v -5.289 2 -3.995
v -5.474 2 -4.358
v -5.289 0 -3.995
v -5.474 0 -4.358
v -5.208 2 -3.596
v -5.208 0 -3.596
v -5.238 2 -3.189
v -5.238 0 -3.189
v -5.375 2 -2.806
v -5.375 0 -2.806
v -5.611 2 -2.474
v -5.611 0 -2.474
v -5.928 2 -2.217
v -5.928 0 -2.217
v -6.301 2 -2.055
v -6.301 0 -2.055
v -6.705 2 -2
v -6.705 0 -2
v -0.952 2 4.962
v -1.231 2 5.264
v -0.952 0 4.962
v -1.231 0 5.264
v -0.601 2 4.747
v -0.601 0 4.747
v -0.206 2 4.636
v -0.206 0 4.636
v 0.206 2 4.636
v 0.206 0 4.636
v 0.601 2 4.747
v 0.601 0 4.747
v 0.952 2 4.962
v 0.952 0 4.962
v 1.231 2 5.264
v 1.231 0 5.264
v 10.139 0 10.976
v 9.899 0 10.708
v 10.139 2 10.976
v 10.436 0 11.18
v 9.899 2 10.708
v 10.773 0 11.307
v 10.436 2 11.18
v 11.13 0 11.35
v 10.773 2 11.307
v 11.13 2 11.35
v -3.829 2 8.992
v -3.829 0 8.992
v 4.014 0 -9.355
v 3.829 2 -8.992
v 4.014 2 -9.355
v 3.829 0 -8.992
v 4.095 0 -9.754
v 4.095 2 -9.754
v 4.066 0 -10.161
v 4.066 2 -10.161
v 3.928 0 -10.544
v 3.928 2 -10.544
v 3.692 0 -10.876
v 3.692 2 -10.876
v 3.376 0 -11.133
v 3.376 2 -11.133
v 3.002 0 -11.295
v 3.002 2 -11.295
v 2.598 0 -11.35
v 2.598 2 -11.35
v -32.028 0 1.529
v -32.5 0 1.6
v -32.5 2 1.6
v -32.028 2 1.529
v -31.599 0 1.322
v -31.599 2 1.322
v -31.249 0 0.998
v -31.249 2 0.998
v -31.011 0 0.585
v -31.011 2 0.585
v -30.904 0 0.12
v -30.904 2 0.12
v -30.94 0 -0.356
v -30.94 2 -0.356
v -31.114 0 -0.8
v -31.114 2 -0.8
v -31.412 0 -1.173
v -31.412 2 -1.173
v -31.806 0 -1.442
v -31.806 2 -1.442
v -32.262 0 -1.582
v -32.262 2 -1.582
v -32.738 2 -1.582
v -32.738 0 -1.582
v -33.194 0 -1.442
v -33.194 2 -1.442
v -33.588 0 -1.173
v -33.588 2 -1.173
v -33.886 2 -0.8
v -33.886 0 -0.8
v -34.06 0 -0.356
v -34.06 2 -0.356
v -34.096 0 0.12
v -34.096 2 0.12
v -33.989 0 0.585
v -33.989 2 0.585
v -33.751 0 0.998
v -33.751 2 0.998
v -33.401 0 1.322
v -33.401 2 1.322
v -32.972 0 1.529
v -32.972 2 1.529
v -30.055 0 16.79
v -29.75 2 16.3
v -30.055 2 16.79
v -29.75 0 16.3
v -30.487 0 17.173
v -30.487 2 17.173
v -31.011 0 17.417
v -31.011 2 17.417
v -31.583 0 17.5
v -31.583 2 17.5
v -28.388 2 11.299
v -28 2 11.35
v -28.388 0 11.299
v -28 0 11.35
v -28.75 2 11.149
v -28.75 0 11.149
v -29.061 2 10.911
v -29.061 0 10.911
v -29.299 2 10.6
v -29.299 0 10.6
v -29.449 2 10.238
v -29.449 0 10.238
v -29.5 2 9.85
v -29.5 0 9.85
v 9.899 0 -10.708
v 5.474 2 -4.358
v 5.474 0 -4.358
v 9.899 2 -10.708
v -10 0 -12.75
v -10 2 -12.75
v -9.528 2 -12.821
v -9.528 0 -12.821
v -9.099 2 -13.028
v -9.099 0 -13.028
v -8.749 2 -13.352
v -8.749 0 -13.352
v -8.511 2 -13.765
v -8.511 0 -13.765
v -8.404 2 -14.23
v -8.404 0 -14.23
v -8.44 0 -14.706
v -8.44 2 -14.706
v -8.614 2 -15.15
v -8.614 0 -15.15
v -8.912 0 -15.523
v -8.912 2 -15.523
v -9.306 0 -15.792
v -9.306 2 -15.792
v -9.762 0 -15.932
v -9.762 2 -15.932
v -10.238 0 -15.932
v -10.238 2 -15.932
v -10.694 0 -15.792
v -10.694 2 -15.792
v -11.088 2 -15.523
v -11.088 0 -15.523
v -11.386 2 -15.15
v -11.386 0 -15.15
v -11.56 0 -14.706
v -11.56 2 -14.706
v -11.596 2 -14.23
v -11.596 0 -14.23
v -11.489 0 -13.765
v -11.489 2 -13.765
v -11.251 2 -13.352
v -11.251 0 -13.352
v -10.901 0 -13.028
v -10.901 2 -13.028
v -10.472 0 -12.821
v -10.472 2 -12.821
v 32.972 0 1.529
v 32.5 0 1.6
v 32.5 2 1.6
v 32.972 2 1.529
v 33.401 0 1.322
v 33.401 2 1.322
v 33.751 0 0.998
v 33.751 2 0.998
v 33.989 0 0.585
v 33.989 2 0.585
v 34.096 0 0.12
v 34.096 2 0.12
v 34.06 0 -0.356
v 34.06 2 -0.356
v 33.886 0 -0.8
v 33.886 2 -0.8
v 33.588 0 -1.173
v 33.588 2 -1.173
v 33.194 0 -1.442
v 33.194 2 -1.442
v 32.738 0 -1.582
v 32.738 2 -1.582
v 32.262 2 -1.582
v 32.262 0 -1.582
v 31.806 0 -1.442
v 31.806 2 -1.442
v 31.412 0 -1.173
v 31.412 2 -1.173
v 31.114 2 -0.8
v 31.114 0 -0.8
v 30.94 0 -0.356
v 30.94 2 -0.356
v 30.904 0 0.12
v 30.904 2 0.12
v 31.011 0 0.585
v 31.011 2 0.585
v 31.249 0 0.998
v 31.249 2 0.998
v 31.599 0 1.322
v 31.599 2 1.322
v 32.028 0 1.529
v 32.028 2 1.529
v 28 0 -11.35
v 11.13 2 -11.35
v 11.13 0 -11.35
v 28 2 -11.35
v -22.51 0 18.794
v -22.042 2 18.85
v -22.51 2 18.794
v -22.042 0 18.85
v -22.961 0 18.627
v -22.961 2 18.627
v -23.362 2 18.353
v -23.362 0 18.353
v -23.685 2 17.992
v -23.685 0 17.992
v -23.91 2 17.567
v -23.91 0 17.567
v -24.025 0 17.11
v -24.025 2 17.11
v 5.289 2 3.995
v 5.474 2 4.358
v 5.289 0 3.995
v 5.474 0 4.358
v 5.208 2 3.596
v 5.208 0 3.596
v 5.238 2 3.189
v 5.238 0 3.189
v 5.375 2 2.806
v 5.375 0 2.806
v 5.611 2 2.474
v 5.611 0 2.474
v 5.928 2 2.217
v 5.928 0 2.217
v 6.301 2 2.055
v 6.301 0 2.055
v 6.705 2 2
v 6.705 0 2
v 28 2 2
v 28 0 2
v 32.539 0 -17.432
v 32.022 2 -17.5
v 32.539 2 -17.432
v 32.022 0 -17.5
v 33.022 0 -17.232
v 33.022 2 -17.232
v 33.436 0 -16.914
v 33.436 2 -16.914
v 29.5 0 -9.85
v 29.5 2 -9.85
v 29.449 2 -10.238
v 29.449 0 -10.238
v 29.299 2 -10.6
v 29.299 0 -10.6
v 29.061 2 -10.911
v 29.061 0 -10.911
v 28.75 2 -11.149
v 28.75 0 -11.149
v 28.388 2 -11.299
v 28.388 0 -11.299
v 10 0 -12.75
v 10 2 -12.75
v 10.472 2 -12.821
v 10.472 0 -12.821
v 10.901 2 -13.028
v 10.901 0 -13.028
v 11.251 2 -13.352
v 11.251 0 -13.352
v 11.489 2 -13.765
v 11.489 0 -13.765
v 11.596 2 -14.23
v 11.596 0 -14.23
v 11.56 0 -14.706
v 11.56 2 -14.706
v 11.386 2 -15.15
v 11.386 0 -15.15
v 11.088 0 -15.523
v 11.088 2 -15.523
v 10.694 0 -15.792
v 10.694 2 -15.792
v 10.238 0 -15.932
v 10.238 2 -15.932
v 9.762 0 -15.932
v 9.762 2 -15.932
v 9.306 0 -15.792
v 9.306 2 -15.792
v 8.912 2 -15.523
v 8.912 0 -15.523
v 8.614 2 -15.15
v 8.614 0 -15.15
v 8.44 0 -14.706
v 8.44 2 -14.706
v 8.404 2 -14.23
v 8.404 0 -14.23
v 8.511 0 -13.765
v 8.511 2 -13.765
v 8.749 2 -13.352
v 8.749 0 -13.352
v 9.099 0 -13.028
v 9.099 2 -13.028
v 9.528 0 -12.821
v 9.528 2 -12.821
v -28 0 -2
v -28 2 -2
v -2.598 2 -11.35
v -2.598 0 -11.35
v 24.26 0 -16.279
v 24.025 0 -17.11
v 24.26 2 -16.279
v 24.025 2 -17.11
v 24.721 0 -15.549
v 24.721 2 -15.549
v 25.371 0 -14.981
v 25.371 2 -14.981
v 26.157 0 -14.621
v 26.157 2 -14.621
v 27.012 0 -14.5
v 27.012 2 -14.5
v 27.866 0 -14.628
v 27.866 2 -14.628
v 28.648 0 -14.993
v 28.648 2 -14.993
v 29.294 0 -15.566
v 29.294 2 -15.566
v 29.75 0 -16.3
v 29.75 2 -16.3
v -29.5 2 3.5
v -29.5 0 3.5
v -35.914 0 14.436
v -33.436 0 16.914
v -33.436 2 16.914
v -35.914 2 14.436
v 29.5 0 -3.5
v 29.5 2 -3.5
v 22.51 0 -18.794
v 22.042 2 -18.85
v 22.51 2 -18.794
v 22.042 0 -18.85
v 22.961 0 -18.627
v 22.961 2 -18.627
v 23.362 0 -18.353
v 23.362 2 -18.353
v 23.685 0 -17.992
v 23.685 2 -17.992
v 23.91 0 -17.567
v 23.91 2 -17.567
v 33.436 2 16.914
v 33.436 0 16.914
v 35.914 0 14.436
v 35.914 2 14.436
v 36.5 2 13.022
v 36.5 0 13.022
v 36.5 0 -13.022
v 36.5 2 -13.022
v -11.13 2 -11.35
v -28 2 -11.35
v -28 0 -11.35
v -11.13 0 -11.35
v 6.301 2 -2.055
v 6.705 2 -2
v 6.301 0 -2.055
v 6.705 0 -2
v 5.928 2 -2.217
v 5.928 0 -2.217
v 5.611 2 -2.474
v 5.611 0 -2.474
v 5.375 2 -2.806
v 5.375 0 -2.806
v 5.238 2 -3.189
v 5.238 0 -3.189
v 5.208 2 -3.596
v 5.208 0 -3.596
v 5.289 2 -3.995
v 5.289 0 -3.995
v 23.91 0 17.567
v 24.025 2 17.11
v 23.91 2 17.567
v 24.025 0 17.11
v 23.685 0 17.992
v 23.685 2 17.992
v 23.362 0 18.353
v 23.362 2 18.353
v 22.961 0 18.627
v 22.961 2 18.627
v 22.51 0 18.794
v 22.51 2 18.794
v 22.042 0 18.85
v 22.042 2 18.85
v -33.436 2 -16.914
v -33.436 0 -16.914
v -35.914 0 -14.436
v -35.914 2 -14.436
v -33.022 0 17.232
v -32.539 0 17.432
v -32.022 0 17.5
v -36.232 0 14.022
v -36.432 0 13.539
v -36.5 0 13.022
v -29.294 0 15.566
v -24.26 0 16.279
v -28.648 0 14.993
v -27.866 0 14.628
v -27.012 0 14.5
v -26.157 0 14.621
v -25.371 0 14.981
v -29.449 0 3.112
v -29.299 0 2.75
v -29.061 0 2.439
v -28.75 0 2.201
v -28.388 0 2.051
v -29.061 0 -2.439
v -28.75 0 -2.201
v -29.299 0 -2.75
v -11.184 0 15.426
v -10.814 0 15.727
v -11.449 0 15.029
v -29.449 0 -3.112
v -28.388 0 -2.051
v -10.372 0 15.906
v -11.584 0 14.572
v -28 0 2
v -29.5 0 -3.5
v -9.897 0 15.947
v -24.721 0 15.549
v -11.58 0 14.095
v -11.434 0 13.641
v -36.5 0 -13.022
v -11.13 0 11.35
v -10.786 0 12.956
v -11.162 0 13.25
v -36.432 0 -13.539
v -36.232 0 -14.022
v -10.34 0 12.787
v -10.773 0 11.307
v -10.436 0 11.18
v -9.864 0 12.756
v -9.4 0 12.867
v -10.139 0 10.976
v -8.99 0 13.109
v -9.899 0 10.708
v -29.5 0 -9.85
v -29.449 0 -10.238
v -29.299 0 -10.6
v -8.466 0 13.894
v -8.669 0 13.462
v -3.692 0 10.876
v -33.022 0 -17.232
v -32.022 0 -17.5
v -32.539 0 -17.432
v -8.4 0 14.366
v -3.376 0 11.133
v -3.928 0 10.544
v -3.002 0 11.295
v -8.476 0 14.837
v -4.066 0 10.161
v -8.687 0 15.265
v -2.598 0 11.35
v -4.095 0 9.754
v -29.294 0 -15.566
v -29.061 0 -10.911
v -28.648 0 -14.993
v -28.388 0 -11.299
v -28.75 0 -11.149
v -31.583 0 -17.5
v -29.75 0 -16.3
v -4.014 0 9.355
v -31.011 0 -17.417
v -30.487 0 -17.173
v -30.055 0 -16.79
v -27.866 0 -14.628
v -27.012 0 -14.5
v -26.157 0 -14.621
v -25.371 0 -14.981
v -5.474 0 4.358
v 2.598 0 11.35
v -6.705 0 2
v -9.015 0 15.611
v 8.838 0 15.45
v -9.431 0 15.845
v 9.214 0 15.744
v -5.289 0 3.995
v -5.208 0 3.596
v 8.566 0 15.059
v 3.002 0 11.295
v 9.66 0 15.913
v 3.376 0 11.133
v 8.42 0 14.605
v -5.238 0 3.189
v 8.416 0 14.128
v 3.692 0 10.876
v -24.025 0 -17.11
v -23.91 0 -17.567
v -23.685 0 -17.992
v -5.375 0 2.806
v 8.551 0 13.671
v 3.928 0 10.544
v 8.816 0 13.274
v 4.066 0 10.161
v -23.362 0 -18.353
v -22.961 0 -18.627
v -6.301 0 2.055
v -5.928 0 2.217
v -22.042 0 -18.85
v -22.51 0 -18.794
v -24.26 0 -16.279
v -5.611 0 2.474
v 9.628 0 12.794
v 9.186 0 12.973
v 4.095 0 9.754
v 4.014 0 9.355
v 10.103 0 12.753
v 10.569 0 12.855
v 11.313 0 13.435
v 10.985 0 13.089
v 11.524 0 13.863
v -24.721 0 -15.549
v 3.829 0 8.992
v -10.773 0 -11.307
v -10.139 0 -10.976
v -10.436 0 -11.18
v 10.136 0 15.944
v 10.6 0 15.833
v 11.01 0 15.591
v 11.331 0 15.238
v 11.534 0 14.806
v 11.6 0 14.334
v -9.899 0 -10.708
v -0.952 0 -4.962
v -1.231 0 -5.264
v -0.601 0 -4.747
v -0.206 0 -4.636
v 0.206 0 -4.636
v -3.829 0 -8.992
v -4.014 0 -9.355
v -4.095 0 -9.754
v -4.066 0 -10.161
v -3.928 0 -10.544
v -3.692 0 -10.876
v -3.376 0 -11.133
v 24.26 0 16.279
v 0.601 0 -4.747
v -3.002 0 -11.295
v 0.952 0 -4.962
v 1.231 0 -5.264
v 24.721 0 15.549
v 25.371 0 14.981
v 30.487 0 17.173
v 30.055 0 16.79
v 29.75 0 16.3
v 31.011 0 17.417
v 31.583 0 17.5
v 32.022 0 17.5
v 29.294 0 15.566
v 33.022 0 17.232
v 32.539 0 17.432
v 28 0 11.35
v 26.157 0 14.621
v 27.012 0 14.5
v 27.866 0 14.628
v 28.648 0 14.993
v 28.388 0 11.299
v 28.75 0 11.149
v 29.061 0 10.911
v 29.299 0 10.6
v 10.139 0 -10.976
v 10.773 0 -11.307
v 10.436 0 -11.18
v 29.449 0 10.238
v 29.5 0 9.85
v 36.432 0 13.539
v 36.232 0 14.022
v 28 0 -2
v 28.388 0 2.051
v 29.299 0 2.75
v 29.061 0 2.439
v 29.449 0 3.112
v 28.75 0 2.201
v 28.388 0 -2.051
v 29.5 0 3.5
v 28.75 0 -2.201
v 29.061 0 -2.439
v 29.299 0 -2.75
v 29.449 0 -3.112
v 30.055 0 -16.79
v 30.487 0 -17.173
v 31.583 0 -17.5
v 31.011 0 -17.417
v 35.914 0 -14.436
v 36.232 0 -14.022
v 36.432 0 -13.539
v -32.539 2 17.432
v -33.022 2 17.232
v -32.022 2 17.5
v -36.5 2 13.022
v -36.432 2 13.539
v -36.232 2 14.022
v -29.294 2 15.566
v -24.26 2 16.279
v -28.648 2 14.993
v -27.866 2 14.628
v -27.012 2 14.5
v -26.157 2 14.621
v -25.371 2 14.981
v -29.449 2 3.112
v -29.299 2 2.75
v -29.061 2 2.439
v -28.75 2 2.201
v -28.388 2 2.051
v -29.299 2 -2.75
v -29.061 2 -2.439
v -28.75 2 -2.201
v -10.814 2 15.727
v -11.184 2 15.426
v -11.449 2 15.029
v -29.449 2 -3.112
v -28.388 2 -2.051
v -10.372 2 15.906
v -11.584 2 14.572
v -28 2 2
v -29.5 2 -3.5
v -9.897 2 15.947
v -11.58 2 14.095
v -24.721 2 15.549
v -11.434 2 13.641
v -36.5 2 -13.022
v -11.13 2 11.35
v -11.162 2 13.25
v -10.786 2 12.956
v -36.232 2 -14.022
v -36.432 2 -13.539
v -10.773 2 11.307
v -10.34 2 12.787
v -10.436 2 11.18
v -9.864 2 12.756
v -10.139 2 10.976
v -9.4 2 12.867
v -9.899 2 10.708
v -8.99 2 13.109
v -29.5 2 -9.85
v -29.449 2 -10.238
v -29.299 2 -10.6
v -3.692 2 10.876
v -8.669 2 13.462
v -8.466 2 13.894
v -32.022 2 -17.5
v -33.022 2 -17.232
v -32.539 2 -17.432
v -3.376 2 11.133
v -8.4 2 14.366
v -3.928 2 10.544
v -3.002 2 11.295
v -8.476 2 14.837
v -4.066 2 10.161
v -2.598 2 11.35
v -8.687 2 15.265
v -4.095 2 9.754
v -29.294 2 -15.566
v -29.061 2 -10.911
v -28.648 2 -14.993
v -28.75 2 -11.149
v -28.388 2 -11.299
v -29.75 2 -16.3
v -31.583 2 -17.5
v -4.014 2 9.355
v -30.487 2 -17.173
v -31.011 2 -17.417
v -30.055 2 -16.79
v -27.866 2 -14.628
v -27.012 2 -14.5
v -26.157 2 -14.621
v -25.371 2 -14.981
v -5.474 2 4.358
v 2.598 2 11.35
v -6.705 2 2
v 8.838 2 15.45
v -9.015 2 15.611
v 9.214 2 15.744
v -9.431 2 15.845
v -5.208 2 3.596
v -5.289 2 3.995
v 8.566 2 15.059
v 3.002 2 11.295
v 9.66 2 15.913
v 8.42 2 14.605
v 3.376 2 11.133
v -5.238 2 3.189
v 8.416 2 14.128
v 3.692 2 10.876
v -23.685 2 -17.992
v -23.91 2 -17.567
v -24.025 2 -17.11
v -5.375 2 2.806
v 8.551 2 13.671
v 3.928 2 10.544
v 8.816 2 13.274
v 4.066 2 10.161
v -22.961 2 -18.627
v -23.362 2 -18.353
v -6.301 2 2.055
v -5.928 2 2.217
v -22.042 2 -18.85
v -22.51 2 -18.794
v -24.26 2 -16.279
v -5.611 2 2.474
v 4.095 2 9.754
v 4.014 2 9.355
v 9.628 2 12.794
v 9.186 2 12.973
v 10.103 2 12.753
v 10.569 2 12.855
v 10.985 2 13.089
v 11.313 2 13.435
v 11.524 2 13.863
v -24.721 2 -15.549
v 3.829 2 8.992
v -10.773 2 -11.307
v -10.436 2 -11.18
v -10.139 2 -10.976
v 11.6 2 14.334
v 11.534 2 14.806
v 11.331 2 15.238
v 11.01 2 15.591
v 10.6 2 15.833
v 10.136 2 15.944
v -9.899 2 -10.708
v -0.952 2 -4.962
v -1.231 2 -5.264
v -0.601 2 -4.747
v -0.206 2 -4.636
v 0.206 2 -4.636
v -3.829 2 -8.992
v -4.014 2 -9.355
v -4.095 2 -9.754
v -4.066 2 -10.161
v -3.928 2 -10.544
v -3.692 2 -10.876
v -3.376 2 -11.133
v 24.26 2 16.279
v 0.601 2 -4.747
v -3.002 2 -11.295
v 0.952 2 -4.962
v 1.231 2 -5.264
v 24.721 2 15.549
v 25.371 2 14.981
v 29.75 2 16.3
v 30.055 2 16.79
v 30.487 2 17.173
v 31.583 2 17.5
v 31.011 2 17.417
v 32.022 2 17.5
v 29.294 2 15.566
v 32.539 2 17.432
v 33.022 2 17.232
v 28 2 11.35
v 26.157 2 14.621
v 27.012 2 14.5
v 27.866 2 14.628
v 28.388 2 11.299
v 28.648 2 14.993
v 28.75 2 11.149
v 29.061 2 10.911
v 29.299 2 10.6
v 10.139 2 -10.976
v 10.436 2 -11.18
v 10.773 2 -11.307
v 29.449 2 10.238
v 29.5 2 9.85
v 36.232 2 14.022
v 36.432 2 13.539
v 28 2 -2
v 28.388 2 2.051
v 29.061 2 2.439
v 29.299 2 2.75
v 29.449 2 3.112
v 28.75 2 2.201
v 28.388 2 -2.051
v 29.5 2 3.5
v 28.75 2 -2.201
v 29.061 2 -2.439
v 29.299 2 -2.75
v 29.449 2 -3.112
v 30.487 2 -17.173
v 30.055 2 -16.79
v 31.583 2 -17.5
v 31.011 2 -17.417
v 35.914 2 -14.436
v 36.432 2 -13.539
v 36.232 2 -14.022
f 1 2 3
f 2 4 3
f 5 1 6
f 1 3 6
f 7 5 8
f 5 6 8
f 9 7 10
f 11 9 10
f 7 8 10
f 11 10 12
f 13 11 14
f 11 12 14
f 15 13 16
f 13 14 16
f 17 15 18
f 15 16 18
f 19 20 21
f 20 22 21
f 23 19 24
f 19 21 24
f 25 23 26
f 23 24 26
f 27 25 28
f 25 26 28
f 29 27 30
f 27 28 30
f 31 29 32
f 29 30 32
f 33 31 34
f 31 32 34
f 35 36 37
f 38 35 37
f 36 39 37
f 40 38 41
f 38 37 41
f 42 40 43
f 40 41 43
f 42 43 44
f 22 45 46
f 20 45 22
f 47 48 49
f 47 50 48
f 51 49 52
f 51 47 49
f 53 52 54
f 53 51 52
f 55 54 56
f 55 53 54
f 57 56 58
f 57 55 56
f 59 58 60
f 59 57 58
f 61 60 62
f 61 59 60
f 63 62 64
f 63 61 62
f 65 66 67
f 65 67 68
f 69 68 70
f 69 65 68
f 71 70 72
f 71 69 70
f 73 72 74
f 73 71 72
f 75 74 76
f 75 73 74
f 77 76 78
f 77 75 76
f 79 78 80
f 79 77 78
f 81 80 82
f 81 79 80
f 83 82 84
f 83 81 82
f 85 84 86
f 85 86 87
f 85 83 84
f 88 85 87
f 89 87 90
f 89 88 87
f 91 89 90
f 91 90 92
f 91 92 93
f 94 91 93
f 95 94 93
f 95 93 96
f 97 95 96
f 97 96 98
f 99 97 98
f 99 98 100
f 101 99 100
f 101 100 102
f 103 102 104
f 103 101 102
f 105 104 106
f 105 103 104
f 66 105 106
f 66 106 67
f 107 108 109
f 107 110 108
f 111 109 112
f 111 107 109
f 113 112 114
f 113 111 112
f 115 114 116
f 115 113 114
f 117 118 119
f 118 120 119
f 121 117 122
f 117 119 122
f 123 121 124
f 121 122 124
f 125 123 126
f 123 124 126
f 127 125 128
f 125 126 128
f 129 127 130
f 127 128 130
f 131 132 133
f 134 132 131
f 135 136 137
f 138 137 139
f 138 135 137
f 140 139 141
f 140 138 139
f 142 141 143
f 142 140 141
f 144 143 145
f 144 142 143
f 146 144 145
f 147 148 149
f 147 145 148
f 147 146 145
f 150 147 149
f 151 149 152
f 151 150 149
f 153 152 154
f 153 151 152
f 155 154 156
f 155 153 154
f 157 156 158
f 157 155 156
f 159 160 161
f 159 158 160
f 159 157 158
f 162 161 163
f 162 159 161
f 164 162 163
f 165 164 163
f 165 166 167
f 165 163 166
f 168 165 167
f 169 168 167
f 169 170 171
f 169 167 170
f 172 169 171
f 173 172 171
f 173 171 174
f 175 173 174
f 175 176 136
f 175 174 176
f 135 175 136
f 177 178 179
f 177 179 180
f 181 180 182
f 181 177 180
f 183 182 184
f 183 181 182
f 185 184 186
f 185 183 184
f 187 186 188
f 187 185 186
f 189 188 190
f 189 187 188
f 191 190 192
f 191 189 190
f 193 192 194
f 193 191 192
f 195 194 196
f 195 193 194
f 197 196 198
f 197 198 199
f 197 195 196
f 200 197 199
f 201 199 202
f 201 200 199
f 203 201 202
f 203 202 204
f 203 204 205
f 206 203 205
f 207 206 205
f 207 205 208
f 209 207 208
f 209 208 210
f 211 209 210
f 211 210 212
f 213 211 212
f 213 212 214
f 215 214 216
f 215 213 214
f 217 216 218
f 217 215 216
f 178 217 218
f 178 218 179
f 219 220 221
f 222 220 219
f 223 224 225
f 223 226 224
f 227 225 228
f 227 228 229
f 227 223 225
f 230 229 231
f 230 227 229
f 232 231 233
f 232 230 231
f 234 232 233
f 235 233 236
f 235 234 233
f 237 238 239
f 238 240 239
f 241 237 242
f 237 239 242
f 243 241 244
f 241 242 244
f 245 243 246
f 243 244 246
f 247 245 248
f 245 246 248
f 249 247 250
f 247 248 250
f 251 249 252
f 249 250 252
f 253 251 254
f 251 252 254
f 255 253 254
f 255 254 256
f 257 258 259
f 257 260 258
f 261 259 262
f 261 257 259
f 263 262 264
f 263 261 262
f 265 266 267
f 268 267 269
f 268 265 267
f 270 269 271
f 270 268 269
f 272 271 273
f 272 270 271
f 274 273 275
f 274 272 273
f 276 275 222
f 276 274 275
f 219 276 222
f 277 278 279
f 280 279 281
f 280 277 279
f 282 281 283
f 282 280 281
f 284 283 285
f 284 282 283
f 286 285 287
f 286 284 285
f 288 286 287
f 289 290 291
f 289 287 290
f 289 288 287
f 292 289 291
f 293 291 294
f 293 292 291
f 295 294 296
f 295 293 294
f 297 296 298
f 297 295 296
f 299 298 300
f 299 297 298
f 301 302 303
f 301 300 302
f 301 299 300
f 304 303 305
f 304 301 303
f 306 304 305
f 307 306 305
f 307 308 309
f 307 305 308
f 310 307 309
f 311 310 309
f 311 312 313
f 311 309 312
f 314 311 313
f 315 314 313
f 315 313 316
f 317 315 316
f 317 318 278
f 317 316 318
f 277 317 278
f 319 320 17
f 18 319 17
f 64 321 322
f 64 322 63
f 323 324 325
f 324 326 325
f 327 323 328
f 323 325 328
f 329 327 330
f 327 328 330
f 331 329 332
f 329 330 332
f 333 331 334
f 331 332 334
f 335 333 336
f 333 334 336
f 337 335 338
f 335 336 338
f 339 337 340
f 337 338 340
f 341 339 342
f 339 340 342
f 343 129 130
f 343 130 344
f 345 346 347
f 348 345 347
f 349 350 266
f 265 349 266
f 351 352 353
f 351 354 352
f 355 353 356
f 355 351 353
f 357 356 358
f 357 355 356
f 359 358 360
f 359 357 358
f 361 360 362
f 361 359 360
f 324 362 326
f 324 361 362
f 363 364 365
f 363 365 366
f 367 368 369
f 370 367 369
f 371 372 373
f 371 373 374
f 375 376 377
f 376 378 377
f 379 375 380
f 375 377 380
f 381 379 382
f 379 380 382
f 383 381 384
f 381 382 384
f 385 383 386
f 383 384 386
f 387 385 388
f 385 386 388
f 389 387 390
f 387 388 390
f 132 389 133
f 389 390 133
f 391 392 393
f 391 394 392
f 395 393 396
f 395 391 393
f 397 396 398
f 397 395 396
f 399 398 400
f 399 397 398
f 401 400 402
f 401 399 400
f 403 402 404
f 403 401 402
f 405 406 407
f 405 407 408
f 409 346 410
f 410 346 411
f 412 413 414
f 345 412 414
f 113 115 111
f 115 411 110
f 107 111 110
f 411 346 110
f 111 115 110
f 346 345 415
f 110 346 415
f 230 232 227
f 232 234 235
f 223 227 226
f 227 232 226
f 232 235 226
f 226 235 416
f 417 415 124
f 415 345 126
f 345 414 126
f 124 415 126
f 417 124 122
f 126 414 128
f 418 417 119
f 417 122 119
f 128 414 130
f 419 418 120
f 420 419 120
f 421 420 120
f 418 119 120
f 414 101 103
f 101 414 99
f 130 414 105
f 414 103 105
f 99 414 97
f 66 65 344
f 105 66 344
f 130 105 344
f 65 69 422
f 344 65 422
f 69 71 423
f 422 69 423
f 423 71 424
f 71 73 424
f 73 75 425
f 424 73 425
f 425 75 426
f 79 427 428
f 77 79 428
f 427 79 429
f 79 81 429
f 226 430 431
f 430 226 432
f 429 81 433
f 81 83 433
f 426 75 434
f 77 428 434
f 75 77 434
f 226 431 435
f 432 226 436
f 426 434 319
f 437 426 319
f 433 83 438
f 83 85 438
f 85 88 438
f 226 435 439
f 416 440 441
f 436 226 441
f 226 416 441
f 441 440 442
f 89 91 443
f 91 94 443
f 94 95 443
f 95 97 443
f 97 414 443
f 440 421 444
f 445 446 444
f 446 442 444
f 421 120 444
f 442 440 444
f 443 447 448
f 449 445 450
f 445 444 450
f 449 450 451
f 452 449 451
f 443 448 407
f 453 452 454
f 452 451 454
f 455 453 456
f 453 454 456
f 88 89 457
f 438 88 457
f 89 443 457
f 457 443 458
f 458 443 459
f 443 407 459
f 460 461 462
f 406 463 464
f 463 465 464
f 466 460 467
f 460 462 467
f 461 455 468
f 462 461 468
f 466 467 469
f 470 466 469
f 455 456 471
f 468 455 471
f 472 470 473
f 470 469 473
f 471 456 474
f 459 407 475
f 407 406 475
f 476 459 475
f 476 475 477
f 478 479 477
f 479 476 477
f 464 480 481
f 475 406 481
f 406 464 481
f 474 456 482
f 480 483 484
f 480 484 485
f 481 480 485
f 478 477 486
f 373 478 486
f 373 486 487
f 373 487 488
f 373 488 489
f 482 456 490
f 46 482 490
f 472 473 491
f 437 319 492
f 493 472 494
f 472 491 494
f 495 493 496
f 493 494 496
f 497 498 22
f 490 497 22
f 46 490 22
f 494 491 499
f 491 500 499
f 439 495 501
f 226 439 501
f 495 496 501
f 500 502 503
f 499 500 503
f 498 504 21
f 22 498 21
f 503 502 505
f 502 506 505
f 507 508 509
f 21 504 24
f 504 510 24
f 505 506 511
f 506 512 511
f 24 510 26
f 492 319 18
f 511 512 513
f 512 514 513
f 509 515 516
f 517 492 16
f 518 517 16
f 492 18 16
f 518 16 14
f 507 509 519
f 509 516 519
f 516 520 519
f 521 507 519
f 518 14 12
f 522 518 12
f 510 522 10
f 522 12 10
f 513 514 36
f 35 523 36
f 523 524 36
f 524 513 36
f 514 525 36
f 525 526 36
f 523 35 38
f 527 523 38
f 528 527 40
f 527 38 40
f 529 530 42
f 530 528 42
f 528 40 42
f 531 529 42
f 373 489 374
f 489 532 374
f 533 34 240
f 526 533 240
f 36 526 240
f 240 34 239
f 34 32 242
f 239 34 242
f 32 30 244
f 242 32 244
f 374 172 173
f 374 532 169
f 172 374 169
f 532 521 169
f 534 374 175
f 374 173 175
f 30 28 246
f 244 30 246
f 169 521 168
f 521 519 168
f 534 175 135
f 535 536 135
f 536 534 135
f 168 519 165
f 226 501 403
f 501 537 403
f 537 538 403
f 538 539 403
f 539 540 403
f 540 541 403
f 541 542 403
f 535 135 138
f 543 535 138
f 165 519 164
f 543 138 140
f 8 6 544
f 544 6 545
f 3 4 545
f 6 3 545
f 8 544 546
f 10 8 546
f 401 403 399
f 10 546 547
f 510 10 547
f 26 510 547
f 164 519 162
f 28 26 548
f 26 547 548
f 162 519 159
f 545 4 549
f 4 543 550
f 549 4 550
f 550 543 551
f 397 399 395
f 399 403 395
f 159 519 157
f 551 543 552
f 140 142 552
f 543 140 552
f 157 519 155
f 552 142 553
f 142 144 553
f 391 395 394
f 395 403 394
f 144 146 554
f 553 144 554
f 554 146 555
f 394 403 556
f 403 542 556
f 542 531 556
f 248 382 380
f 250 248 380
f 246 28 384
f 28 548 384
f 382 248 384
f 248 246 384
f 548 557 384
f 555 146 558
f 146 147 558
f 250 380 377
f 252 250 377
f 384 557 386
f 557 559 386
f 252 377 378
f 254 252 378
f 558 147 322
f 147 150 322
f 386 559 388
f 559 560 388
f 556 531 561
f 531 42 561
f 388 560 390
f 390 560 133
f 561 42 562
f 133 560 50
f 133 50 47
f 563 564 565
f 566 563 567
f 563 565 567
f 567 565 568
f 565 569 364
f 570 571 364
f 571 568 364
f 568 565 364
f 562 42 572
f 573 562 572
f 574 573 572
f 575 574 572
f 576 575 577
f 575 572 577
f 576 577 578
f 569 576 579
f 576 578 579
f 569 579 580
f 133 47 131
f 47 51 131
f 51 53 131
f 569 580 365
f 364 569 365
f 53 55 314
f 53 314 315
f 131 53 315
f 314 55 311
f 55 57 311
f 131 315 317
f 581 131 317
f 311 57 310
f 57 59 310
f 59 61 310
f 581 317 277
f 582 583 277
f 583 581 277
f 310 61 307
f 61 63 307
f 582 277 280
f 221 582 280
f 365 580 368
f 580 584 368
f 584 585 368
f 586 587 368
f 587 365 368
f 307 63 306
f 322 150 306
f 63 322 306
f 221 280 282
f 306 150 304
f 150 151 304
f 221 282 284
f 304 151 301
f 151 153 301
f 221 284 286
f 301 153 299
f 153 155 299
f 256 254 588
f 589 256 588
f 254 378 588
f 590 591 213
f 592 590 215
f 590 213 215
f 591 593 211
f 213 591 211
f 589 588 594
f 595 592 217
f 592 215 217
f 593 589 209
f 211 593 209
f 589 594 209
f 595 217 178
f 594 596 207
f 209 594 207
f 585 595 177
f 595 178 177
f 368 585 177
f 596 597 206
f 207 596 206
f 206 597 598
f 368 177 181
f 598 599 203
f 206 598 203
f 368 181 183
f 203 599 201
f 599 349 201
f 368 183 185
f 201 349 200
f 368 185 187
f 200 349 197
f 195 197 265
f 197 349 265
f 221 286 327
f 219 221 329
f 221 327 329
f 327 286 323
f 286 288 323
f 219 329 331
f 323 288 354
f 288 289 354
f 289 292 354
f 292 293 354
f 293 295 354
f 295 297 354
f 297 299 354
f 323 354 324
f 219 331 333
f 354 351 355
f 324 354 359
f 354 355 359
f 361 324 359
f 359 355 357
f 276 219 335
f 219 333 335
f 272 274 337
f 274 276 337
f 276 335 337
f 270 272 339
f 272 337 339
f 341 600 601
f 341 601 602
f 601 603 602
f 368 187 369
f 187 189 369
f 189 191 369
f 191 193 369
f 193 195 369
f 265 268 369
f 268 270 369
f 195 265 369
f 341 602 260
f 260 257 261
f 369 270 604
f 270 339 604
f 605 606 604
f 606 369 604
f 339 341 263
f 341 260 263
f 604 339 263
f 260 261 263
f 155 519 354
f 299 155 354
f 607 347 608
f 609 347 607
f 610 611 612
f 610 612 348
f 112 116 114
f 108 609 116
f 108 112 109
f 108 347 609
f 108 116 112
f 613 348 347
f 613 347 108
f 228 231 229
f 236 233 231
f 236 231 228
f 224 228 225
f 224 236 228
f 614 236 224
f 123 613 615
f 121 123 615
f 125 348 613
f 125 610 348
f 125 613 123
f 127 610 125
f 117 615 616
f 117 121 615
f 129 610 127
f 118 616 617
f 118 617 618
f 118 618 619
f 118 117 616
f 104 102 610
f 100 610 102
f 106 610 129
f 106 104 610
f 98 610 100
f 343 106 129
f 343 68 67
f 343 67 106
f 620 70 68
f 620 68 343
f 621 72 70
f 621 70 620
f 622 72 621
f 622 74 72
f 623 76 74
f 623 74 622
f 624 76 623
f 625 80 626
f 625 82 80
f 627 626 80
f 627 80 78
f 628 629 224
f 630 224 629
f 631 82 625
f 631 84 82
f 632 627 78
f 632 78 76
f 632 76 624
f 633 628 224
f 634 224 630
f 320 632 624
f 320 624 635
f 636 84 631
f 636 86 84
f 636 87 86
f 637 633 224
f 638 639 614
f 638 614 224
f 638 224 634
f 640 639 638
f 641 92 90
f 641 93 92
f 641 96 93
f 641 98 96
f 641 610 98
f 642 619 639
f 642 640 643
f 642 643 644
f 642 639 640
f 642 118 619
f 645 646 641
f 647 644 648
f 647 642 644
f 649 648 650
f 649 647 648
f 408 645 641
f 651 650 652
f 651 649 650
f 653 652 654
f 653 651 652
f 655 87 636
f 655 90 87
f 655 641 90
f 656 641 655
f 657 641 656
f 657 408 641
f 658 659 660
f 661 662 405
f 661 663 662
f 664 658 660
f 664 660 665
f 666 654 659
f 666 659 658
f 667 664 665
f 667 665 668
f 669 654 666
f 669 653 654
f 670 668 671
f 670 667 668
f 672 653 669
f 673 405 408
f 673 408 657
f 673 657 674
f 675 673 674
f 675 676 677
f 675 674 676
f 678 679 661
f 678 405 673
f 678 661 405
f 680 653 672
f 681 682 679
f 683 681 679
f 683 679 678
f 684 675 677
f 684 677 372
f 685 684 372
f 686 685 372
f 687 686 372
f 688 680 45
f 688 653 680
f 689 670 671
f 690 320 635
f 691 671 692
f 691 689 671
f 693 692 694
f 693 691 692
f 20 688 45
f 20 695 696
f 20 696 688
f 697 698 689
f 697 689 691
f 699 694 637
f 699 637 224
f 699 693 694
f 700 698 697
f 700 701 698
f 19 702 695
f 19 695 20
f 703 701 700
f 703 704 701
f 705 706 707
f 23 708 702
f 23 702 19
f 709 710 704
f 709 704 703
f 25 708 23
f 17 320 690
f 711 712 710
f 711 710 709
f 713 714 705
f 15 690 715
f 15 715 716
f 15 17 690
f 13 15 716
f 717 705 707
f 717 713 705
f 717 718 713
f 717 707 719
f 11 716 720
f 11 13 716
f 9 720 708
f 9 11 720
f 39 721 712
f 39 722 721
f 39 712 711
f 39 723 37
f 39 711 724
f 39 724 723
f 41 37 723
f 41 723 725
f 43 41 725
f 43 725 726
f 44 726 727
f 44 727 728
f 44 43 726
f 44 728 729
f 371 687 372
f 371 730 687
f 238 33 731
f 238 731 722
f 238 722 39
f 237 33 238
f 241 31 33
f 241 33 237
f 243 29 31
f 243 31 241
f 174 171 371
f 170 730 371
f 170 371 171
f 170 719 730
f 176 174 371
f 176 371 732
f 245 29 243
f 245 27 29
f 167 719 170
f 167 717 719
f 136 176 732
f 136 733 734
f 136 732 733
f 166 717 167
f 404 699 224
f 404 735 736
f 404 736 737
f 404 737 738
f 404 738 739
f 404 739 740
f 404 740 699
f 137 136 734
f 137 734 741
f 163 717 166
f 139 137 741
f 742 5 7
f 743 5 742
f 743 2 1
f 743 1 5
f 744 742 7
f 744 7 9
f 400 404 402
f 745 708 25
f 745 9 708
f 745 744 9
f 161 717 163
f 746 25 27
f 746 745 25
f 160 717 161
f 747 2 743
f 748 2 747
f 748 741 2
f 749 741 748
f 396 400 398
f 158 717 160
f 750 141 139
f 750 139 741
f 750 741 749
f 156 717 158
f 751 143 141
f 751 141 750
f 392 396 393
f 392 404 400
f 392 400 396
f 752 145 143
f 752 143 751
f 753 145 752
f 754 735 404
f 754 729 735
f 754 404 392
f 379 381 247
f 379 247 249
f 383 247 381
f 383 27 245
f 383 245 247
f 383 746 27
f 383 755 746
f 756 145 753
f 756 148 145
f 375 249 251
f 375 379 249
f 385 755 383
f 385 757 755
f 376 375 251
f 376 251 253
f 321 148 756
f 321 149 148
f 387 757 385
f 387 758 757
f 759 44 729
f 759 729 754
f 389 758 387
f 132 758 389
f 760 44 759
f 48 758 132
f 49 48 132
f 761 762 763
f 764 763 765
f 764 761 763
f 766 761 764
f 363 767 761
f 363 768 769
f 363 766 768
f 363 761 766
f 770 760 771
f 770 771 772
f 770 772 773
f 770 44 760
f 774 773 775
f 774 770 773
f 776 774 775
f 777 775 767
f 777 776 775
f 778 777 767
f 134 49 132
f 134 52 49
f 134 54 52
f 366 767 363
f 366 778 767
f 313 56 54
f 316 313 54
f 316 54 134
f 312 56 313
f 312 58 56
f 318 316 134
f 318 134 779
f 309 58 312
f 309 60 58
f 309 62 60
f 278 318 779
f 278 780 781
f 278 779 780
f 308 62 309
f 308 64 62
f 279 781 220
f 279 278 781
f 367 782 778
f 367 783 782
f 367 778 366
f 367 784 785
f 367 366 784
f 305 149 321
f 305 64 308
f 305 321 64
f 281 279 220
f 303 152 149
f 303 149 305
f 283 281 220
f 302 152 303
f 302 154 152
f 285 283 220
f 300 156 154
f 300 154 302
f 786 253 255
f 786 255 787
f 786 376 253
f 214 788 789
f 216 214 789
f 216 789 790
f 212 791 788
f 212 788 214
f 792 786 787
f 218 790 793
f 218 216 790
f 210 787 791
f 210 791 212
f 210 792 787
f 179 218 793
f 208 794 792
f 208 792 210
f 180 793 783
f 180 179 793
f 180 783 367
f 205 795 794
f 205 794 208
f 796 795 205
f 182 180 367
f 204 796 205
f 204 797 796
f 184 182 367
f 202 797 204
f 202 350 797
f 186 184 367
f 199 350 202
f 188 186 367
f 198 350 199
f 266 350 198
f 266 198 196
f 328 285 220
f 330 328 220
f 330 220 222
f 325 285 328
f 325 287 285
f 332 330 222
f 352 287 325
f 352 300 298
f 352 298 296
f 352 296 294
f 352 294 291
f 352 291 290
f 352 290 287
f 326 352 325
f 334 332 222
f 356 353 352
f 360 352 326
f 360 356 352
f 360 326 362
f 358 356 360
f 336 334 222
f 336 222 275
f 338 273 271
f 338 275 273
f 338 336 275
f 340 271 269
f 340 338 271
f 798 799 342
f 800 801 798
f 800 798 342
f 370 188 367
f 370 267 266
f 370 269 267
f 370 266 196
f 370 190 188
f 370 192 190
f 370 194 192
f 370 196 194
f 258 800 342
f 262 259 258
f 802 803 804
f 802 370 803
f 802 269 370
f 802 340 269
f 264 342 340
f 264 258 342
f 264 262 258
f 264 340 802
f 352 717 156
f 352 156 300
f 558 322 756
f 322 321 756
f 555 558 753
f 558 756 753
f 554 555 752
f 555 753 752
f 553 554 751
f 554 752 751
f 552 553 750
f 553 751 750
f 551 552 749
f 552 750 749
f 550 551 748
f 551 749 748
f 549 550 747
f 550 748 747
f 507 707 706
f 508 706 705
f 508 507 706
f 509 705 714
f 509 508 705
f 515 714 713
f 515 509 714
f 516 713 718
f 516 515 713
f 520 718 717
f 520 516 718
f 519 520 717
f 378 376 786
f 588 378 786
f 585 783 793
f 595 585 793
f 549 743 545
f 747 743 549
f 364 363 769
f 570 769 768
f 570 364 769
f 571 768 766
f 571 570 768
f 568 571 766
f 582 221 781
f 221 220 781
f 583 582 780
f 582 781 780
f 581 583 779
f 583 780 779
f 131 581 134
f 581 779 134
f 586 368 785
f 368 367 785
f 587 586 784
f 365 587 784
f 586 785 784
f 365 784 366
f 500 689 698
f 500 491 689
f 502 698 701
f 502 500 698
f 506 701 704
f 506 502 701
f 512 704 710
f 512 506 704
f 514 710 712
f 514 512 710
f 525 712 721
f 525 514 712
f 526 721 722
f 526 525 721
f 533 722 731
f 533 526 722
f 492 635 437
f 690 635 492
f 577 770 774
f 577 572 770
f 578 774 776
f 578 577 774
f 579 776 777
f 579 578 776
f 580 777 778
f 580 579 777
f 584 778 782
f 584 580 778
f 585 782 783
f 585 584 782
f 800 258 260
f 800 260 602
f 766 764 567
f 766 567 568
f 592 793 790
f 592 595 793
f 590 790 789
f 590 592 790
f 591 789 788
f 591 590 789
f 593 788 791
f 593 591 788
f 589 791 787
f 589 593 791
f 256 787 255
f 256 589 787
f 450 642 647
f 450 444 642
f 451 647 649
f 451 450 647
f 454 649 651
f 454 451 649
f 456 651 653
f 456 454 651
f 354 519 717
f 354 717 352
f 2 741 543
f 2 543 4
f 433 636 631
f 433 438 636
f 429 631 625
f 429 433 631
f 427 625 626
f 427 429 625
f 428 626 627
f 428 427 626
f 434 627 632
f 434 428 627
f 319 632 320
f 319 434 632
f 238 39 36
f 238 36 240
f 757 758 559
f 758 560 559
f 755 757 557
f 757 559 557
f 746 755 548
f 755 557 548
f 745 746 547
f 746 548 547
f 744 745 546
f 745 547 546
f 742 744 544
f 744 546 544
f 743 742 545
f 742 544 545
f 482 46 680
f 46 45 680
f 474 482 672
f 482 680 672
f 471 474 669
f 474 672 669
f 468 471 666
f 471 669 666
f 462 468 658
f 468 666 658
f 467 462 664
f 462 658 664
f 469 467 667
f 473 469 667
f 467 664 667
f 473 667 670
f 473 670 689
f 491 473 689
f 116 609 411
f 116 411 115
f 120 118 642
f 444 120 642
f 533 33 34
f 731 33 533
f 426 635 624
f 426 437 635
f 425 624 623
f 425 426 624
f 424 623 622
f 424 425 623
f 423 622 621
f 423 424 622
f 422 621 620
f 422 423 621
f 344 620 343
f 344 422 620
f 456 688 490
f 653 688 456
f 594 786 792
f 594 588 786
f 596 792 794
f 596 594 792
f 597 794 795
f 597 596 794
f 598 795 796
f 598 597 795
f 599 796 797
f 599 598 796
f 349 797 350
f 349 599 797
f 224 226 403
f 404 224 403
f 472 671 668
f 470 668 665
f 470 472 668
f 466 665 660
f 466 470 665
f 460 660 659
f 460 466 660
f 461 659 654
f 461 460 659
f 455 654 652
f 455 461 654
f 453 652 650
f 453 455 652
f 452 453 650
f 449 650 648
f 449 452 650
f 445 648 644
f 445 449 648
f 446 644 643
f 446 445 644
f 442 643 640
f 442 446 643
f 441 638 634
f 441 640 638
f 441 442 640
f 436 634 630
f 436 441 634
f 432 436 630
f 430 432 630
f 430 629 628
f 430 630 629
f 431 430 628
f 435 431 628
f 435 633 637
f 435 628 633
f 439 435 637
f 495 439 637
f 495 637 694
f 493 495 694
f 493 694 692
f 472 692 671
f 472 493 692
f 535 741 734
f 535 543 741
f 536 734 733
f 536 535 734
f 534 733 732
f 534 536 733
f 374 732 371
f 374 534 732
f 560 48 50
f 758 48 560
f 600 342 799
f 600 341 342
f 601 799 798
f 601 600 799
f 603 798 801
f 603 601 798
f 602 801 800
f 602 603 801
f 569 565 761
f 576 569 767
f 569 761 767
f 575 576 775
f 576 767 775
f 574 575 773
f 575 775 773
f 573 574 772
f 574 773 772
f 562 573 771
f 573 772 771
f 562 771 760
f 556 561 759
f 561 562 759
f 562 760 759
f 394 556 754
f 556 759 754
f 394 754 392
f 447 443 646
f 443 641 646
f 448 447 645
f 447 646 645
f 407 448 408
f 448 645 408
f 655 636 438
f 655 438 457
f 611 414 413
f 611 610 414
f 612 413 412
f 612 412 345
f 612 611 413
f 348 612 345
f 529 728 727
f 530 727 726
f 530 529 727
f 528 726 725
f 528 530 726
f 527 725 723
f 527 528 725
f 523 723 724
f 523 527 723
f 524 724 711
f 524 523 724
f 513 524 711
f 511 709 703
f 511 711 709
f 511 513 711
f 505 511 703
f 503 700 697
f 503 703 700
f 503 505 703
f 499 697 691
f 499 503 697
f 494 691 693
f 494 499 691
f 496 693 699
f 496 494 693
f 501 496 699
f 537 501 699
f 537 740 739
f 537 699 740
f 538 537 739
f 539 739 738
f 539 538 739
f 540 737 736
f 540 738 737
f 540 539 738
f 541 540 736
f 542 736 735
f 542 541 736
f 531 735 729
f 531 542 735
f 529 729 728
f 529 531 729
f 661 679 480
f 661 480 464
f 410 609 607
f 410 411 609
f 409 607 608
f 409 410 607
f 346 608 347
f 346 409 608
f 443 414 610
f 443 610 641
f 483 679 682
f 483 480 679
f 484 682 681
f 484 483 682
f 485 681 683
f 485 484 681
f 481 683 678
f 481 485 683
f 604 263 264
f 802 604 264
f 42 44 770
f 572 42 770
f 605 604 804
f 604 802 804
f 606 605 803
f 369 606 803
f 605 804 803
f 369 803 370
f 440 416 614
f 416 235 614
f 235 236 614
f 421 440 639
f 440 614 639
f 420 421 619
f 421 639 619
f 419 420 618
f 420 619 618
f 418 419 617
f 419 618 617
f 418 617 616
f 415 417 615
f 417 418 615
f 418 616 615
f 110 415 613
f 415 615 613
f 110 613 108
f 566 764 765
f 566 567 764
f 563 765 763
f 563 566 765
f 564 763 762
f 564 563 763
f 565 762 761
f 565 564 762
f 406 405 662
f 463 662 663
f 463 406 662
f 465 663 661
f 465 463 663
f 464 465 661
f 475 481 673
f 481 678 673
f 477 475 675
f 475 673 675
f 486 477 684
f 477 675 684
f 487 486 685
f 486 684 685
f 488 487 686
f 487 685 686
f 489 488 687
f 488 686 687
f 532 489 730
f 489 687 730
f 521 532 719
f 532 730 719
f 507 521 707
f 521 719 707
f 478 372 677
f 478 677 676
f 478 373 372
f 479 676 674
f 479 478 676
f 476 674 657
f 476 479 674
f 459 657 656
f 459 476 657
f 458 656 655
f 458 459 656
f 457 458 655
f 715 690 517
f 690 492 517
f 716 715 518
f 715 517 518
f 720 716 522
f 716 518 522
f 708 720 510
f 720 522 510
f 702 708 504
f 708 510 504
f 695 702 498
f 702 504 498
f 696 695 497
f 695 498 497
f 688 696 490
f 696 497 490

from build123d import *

# Parameters (mm, degrees)
SKETCH_1_W          = 73
SKETCH_1_H          = 37.7
SKETCH_1_R          = 1.6
EXTRUDE_1_DEPTH     = 2
SKETCH_2_W          = 59
SKETCH_2_H          = 22.7
CUT_EXTRUDE_1_DEPTH = 10
SKETCH_3_W          = 59
SKETCH_3_H          = 4
EXTRUDE_1_2_DEPTH   = 2
CUT_EXTRUDE_START   = -2
SKETCH_4_R          = 1.6
CUT_EXTRUDE_2_DEPTH = 2
FILLET_2_R          = 1.5
CHAMFER_1_SIZE      = 5
SKETCH_6_R          = 3
CUT_EXTRUDE_3_DEPTH = 10
CUT_EXTRUDE_4_DEPTH = 10
FILLET_3_R          = 2


with BuildPart() as part:
    # 草图1 → Extrude 1 (new body)
    with BuildSketch(Plane(origin=(0, 0, 0), x_dir=(1, 0, 0), z_dir=(0, 1, 0))):
        Rectangle(SKETCH_1_W, SKETCH_1_H)
        with Locations(Location((10, -14.35, 0), (0, 0, 270))):
            Circle(SKETCH_1_R, mode=Mode.SUBTRACT)
        with Locations(Location((-10, -14.35, 0), (0, 0, 270))):
            Circle(SKETCH_1_R, mode=Mode.SUBTRACT)
        with Locations(Location((-10, 14.35, 0), (0, 0, 270))):
            Circle(SKETCH_1_R, mode=Mode.SUBTRACT)
        with Locations(Location((10, 14.35, 0), (0, 0, 270))):
            Circle(SKETCH_1_R, mode=Mode.SUBTRACT)
        with Locations(Location((-32.5, 0, 0), (0, 0, 270))):
            Circle(SKETCH_1_R, mode=Mode.SUBTRACT)
        with Locations(Location((32.5, 0, 0), (0, 0, 270))):
            Circle(SKETCH_1_R, mode=Mode.SUBTRACT)
    extrude(amount=EXTRUDE_1_DEPTH)

    # 草图2 → 切除-拉伸1 (cut)
    with BuildSketch(Plane(origin=(0, 2, 0), x_dir=(1, 0, 0), z_dir=(0, 1, 0))):
        Rectangle(SKETCH_2_W, SKETCH_2_H)
    extrude(amount=-CUT_EXTRUDE_1_DEPTH, mode=Mode.SUBTRACT)

    # 草图3 → Extrude 1 2 (add)
    with BuildSketch(Plane(origin=(0, 2, 0), x_dir=(1, 0, 0), z_dir=(0, 1, 0))):
        Rectangle(SKETCH_3_W, SKETCH_3_H)
        Polygon((-11.640877602, 13.206531288), (8.359122398, -15.493468712), (11.640877602, -13.206531288), (-8.359122398, 15.493468712), align=None)
        Polygon((8.359122398, 15.493468712), (-11.640877602, -13.206531288), (-8.359122398, -15.493468712), (11.640877602, 13.206531288), align=None)
    extrude(amount=-EXTRUDE_1_2_DEPTH)

    # 草图4 → 切除-拉伸2 (cut)
    with BuildSketch(Plane(origin=(0, 2, 0), x_dir=(1, 0, 0), z_dir=(0, 1, 0)).offset(CUT_EXTRUDE_START)):
        with Locations(Location((10, -14.35, 0), (0, 0, 270))):
            Circle(SKETCH_4_R)
        with Locations(Location((-10, -14.35, 0), (0, 0, 270))):
            Circle(SKETCH_4_R)
        with Locations(Location((10, 14.35, 0), (0, 0, 270))):
            Circle(SKETCH_4_R)
        with Locations(Location((-10, 14.35, 0), (0, 0, 270))):
            Circle(SKETCH_4_R)
    extrude(amount=CUT_EXTRUDE_2_DEPTH, mode=Mode.SUBTRACT)

    # 圆角2
    fillet_2_edges = [part.edges().sort_by_distance(p)[0] for p in [
        (-3.831448133, 1, 2),
        (0, 1, -3.498128071),
        (3.831448133, 1, -2),
        (3.831448133, 1, 2),
        (29.5, 1, 2),
        (-29.5, 1, 2),
        (-3.831448133, 1, -2),
        (-29.5, 1, -2),
        (29.5, 1, -2),
        (29.5, 1, -11.35),
        (29.5, 1, 11.35),
        (-29.5, 1, 11.35),
        (-29.5, 1, -11.35),
        (-10.347127575, 1, -11.35),
        (10.347127575, 1, -11.35),
        (5.471687756, 1, -11.35),
        (-5.471687756, 1, -11.35),
        (-5.471687756, 1, 11.35),
        (-10.347127575, 1, 11.35),
        (10.347127575, 1, 11.35),
        (5.471687756, 1, 11.35),
        (0, 1, 3.498128071),
    ]]
    fillet(fillet_2_edges, radius=FILLET_2_R)

    # 倒角1
    chamfer_1_edges = [part.edges().sort_by_distance(p)[0] for p in [
        (36.5, 1, 18.85),
        (-36.5, 1, 18.85),
        (-36.5, 1, -18.85),
        (36.5, 1, -18.85),
    ]]
    chamfer(chamfer_1_edges, length=CHAMFER_1_SIZE)

    # 草图6 → 切除-拉伸3 (cut)
    with BuildSketch(Plane(origin=(0, 2, 0), x_dir=(1, 0, 0), z_dir=(0, 1, 0))):
        with Locations((27, 17.5)):
            Circle(SKETCH_6_R)
        with Locations((27, -17.5)):
            Circle(SKETCH_6_R)
        with Locations((-27, -17.5)):
            Circle(SKETCH_6_R)
        with Locations((-27, 17.5)):
            Circle(SKETCH_6_R)
    extrude(amount=-CUT_EXTRUDE_3_DEPTH, mode=Mode.SUBTRACT)

    # 草图7 → 切除-拉伸4 (cut)
    with BuildSketch(Plane(origin=(0, 2, 0), x_dir=(1, 0, 0), z_dir=(0, 1, 0))):
        with BuildLine():
            Line((30, -17.5), (32.85, -17.5))
            Line((32.85, -17.5), (31.5, -18.85))
            Line((31.5, -18.85), (29.679085665, -18.85))
            ThreePointArc((29.679085665, -18.85), (29.91866896, -18.193809414), (30, -17.5))
        make_face()
        with BuildLine():
            Line((24, -17.5), (24, -18.85))
            Line((24, -18.85), (24.320914335, -18.85))
            ThreePointArc((24.320914335, -18.85), (24.08133104, -18.193809414), (24, -17.5))
        make_face()
        with BuildLine():
            Line((24.320914335, 18.85), (24, 18.85))
            Line((24, 18.85), (24, 17.5))
            ThreePointArc((24, 17.5), (24.08133104, 18.193809414), (24.320914335, 18.85))
        make_face()
        with BuildLine():
            Line((31.5, 18.85), (32.85, 17.5))
            Line((32.85, 17.5), (30, 17.5))
            ThreePointArc((30, 17.5), (29.91866896, 18.193809414), (29.679085665, 18.85))
            Line((29.679085665, 18.85), (31.5, 18.85))
        make_face()
        with BuildLine():
            Line((-30, 17.5), (-32.85, 17.5))
            Line((-32.85, 17.5), (-31.5, 18.85))
            Line((-31.5, 18.85), (-29.679085665, 18.85))
            ThreePointArc((-29.679085665, 18.85), (-29.91866896, 18.193809414), (-30, 17.5))
        make_face()
        with BuildLine():
            Line((-24, 17.5), (-24, 18.85))
            Line((-24, 18.85), (-24.320914335, 18.85))
            ThreePointArc((-24.320914335, 18.85), (-24.08133104, 18.193809414), (-24, 17.5))
        make_face()
        with BuildLine():
            Line((-24.320914335, -18.85), (-24, -18.85))
            Line((-24, -18.85), (-24, -17.5))
            ThreePointArc((-24, -17.5), (-24.08133104, -18.193809414), (-24.320914335, -18.85))
        make_face()
        with BuildLine():
            Line((-31.5, -18.85), (-32.85, -17.5))
            Line((-32.85, -17.5), (-30, -17.5))
            ThreePointArc((-30, -17.5), (-29.91866896, -18.193809414), (-29.679085665, -18.85))
            Line((-29.679085665, -18.85), (-31.5, -18.85))
        make_face()
    extrude(amount=-CUT_EXTRUDE_4_DEPTH, mode=Mode.SUBTRACT)

    # 圆角3
    fillet_3_edges = [part.edges().sort_by_distance(p)[0] for p in [
        (-36.5, 1, -13.85),
        (-36.5, 1, 13.85),
        (36.5, 1, 13.85),
        (36.5, 1, -13.85),
        (-32.85, 1, 17.5),
        (-30, 1, 17.5),
        (24, 1, 18.85),
        (30, 1, 17.5),
        (32.85, 1, 17.5),
        (32.85, 1, -17.5),
        (30, 1, -17.5),
        (24, 1, -18.85),
        (-24, 1, -18.85),
        (-30, 1, -17.5),
        (-32.85, 1, -17.5),
        (-24, 1, 18.85),
    ]]
    fillet(fillet_3_edges, radius=FILLET_3_R)


solid = part.part
